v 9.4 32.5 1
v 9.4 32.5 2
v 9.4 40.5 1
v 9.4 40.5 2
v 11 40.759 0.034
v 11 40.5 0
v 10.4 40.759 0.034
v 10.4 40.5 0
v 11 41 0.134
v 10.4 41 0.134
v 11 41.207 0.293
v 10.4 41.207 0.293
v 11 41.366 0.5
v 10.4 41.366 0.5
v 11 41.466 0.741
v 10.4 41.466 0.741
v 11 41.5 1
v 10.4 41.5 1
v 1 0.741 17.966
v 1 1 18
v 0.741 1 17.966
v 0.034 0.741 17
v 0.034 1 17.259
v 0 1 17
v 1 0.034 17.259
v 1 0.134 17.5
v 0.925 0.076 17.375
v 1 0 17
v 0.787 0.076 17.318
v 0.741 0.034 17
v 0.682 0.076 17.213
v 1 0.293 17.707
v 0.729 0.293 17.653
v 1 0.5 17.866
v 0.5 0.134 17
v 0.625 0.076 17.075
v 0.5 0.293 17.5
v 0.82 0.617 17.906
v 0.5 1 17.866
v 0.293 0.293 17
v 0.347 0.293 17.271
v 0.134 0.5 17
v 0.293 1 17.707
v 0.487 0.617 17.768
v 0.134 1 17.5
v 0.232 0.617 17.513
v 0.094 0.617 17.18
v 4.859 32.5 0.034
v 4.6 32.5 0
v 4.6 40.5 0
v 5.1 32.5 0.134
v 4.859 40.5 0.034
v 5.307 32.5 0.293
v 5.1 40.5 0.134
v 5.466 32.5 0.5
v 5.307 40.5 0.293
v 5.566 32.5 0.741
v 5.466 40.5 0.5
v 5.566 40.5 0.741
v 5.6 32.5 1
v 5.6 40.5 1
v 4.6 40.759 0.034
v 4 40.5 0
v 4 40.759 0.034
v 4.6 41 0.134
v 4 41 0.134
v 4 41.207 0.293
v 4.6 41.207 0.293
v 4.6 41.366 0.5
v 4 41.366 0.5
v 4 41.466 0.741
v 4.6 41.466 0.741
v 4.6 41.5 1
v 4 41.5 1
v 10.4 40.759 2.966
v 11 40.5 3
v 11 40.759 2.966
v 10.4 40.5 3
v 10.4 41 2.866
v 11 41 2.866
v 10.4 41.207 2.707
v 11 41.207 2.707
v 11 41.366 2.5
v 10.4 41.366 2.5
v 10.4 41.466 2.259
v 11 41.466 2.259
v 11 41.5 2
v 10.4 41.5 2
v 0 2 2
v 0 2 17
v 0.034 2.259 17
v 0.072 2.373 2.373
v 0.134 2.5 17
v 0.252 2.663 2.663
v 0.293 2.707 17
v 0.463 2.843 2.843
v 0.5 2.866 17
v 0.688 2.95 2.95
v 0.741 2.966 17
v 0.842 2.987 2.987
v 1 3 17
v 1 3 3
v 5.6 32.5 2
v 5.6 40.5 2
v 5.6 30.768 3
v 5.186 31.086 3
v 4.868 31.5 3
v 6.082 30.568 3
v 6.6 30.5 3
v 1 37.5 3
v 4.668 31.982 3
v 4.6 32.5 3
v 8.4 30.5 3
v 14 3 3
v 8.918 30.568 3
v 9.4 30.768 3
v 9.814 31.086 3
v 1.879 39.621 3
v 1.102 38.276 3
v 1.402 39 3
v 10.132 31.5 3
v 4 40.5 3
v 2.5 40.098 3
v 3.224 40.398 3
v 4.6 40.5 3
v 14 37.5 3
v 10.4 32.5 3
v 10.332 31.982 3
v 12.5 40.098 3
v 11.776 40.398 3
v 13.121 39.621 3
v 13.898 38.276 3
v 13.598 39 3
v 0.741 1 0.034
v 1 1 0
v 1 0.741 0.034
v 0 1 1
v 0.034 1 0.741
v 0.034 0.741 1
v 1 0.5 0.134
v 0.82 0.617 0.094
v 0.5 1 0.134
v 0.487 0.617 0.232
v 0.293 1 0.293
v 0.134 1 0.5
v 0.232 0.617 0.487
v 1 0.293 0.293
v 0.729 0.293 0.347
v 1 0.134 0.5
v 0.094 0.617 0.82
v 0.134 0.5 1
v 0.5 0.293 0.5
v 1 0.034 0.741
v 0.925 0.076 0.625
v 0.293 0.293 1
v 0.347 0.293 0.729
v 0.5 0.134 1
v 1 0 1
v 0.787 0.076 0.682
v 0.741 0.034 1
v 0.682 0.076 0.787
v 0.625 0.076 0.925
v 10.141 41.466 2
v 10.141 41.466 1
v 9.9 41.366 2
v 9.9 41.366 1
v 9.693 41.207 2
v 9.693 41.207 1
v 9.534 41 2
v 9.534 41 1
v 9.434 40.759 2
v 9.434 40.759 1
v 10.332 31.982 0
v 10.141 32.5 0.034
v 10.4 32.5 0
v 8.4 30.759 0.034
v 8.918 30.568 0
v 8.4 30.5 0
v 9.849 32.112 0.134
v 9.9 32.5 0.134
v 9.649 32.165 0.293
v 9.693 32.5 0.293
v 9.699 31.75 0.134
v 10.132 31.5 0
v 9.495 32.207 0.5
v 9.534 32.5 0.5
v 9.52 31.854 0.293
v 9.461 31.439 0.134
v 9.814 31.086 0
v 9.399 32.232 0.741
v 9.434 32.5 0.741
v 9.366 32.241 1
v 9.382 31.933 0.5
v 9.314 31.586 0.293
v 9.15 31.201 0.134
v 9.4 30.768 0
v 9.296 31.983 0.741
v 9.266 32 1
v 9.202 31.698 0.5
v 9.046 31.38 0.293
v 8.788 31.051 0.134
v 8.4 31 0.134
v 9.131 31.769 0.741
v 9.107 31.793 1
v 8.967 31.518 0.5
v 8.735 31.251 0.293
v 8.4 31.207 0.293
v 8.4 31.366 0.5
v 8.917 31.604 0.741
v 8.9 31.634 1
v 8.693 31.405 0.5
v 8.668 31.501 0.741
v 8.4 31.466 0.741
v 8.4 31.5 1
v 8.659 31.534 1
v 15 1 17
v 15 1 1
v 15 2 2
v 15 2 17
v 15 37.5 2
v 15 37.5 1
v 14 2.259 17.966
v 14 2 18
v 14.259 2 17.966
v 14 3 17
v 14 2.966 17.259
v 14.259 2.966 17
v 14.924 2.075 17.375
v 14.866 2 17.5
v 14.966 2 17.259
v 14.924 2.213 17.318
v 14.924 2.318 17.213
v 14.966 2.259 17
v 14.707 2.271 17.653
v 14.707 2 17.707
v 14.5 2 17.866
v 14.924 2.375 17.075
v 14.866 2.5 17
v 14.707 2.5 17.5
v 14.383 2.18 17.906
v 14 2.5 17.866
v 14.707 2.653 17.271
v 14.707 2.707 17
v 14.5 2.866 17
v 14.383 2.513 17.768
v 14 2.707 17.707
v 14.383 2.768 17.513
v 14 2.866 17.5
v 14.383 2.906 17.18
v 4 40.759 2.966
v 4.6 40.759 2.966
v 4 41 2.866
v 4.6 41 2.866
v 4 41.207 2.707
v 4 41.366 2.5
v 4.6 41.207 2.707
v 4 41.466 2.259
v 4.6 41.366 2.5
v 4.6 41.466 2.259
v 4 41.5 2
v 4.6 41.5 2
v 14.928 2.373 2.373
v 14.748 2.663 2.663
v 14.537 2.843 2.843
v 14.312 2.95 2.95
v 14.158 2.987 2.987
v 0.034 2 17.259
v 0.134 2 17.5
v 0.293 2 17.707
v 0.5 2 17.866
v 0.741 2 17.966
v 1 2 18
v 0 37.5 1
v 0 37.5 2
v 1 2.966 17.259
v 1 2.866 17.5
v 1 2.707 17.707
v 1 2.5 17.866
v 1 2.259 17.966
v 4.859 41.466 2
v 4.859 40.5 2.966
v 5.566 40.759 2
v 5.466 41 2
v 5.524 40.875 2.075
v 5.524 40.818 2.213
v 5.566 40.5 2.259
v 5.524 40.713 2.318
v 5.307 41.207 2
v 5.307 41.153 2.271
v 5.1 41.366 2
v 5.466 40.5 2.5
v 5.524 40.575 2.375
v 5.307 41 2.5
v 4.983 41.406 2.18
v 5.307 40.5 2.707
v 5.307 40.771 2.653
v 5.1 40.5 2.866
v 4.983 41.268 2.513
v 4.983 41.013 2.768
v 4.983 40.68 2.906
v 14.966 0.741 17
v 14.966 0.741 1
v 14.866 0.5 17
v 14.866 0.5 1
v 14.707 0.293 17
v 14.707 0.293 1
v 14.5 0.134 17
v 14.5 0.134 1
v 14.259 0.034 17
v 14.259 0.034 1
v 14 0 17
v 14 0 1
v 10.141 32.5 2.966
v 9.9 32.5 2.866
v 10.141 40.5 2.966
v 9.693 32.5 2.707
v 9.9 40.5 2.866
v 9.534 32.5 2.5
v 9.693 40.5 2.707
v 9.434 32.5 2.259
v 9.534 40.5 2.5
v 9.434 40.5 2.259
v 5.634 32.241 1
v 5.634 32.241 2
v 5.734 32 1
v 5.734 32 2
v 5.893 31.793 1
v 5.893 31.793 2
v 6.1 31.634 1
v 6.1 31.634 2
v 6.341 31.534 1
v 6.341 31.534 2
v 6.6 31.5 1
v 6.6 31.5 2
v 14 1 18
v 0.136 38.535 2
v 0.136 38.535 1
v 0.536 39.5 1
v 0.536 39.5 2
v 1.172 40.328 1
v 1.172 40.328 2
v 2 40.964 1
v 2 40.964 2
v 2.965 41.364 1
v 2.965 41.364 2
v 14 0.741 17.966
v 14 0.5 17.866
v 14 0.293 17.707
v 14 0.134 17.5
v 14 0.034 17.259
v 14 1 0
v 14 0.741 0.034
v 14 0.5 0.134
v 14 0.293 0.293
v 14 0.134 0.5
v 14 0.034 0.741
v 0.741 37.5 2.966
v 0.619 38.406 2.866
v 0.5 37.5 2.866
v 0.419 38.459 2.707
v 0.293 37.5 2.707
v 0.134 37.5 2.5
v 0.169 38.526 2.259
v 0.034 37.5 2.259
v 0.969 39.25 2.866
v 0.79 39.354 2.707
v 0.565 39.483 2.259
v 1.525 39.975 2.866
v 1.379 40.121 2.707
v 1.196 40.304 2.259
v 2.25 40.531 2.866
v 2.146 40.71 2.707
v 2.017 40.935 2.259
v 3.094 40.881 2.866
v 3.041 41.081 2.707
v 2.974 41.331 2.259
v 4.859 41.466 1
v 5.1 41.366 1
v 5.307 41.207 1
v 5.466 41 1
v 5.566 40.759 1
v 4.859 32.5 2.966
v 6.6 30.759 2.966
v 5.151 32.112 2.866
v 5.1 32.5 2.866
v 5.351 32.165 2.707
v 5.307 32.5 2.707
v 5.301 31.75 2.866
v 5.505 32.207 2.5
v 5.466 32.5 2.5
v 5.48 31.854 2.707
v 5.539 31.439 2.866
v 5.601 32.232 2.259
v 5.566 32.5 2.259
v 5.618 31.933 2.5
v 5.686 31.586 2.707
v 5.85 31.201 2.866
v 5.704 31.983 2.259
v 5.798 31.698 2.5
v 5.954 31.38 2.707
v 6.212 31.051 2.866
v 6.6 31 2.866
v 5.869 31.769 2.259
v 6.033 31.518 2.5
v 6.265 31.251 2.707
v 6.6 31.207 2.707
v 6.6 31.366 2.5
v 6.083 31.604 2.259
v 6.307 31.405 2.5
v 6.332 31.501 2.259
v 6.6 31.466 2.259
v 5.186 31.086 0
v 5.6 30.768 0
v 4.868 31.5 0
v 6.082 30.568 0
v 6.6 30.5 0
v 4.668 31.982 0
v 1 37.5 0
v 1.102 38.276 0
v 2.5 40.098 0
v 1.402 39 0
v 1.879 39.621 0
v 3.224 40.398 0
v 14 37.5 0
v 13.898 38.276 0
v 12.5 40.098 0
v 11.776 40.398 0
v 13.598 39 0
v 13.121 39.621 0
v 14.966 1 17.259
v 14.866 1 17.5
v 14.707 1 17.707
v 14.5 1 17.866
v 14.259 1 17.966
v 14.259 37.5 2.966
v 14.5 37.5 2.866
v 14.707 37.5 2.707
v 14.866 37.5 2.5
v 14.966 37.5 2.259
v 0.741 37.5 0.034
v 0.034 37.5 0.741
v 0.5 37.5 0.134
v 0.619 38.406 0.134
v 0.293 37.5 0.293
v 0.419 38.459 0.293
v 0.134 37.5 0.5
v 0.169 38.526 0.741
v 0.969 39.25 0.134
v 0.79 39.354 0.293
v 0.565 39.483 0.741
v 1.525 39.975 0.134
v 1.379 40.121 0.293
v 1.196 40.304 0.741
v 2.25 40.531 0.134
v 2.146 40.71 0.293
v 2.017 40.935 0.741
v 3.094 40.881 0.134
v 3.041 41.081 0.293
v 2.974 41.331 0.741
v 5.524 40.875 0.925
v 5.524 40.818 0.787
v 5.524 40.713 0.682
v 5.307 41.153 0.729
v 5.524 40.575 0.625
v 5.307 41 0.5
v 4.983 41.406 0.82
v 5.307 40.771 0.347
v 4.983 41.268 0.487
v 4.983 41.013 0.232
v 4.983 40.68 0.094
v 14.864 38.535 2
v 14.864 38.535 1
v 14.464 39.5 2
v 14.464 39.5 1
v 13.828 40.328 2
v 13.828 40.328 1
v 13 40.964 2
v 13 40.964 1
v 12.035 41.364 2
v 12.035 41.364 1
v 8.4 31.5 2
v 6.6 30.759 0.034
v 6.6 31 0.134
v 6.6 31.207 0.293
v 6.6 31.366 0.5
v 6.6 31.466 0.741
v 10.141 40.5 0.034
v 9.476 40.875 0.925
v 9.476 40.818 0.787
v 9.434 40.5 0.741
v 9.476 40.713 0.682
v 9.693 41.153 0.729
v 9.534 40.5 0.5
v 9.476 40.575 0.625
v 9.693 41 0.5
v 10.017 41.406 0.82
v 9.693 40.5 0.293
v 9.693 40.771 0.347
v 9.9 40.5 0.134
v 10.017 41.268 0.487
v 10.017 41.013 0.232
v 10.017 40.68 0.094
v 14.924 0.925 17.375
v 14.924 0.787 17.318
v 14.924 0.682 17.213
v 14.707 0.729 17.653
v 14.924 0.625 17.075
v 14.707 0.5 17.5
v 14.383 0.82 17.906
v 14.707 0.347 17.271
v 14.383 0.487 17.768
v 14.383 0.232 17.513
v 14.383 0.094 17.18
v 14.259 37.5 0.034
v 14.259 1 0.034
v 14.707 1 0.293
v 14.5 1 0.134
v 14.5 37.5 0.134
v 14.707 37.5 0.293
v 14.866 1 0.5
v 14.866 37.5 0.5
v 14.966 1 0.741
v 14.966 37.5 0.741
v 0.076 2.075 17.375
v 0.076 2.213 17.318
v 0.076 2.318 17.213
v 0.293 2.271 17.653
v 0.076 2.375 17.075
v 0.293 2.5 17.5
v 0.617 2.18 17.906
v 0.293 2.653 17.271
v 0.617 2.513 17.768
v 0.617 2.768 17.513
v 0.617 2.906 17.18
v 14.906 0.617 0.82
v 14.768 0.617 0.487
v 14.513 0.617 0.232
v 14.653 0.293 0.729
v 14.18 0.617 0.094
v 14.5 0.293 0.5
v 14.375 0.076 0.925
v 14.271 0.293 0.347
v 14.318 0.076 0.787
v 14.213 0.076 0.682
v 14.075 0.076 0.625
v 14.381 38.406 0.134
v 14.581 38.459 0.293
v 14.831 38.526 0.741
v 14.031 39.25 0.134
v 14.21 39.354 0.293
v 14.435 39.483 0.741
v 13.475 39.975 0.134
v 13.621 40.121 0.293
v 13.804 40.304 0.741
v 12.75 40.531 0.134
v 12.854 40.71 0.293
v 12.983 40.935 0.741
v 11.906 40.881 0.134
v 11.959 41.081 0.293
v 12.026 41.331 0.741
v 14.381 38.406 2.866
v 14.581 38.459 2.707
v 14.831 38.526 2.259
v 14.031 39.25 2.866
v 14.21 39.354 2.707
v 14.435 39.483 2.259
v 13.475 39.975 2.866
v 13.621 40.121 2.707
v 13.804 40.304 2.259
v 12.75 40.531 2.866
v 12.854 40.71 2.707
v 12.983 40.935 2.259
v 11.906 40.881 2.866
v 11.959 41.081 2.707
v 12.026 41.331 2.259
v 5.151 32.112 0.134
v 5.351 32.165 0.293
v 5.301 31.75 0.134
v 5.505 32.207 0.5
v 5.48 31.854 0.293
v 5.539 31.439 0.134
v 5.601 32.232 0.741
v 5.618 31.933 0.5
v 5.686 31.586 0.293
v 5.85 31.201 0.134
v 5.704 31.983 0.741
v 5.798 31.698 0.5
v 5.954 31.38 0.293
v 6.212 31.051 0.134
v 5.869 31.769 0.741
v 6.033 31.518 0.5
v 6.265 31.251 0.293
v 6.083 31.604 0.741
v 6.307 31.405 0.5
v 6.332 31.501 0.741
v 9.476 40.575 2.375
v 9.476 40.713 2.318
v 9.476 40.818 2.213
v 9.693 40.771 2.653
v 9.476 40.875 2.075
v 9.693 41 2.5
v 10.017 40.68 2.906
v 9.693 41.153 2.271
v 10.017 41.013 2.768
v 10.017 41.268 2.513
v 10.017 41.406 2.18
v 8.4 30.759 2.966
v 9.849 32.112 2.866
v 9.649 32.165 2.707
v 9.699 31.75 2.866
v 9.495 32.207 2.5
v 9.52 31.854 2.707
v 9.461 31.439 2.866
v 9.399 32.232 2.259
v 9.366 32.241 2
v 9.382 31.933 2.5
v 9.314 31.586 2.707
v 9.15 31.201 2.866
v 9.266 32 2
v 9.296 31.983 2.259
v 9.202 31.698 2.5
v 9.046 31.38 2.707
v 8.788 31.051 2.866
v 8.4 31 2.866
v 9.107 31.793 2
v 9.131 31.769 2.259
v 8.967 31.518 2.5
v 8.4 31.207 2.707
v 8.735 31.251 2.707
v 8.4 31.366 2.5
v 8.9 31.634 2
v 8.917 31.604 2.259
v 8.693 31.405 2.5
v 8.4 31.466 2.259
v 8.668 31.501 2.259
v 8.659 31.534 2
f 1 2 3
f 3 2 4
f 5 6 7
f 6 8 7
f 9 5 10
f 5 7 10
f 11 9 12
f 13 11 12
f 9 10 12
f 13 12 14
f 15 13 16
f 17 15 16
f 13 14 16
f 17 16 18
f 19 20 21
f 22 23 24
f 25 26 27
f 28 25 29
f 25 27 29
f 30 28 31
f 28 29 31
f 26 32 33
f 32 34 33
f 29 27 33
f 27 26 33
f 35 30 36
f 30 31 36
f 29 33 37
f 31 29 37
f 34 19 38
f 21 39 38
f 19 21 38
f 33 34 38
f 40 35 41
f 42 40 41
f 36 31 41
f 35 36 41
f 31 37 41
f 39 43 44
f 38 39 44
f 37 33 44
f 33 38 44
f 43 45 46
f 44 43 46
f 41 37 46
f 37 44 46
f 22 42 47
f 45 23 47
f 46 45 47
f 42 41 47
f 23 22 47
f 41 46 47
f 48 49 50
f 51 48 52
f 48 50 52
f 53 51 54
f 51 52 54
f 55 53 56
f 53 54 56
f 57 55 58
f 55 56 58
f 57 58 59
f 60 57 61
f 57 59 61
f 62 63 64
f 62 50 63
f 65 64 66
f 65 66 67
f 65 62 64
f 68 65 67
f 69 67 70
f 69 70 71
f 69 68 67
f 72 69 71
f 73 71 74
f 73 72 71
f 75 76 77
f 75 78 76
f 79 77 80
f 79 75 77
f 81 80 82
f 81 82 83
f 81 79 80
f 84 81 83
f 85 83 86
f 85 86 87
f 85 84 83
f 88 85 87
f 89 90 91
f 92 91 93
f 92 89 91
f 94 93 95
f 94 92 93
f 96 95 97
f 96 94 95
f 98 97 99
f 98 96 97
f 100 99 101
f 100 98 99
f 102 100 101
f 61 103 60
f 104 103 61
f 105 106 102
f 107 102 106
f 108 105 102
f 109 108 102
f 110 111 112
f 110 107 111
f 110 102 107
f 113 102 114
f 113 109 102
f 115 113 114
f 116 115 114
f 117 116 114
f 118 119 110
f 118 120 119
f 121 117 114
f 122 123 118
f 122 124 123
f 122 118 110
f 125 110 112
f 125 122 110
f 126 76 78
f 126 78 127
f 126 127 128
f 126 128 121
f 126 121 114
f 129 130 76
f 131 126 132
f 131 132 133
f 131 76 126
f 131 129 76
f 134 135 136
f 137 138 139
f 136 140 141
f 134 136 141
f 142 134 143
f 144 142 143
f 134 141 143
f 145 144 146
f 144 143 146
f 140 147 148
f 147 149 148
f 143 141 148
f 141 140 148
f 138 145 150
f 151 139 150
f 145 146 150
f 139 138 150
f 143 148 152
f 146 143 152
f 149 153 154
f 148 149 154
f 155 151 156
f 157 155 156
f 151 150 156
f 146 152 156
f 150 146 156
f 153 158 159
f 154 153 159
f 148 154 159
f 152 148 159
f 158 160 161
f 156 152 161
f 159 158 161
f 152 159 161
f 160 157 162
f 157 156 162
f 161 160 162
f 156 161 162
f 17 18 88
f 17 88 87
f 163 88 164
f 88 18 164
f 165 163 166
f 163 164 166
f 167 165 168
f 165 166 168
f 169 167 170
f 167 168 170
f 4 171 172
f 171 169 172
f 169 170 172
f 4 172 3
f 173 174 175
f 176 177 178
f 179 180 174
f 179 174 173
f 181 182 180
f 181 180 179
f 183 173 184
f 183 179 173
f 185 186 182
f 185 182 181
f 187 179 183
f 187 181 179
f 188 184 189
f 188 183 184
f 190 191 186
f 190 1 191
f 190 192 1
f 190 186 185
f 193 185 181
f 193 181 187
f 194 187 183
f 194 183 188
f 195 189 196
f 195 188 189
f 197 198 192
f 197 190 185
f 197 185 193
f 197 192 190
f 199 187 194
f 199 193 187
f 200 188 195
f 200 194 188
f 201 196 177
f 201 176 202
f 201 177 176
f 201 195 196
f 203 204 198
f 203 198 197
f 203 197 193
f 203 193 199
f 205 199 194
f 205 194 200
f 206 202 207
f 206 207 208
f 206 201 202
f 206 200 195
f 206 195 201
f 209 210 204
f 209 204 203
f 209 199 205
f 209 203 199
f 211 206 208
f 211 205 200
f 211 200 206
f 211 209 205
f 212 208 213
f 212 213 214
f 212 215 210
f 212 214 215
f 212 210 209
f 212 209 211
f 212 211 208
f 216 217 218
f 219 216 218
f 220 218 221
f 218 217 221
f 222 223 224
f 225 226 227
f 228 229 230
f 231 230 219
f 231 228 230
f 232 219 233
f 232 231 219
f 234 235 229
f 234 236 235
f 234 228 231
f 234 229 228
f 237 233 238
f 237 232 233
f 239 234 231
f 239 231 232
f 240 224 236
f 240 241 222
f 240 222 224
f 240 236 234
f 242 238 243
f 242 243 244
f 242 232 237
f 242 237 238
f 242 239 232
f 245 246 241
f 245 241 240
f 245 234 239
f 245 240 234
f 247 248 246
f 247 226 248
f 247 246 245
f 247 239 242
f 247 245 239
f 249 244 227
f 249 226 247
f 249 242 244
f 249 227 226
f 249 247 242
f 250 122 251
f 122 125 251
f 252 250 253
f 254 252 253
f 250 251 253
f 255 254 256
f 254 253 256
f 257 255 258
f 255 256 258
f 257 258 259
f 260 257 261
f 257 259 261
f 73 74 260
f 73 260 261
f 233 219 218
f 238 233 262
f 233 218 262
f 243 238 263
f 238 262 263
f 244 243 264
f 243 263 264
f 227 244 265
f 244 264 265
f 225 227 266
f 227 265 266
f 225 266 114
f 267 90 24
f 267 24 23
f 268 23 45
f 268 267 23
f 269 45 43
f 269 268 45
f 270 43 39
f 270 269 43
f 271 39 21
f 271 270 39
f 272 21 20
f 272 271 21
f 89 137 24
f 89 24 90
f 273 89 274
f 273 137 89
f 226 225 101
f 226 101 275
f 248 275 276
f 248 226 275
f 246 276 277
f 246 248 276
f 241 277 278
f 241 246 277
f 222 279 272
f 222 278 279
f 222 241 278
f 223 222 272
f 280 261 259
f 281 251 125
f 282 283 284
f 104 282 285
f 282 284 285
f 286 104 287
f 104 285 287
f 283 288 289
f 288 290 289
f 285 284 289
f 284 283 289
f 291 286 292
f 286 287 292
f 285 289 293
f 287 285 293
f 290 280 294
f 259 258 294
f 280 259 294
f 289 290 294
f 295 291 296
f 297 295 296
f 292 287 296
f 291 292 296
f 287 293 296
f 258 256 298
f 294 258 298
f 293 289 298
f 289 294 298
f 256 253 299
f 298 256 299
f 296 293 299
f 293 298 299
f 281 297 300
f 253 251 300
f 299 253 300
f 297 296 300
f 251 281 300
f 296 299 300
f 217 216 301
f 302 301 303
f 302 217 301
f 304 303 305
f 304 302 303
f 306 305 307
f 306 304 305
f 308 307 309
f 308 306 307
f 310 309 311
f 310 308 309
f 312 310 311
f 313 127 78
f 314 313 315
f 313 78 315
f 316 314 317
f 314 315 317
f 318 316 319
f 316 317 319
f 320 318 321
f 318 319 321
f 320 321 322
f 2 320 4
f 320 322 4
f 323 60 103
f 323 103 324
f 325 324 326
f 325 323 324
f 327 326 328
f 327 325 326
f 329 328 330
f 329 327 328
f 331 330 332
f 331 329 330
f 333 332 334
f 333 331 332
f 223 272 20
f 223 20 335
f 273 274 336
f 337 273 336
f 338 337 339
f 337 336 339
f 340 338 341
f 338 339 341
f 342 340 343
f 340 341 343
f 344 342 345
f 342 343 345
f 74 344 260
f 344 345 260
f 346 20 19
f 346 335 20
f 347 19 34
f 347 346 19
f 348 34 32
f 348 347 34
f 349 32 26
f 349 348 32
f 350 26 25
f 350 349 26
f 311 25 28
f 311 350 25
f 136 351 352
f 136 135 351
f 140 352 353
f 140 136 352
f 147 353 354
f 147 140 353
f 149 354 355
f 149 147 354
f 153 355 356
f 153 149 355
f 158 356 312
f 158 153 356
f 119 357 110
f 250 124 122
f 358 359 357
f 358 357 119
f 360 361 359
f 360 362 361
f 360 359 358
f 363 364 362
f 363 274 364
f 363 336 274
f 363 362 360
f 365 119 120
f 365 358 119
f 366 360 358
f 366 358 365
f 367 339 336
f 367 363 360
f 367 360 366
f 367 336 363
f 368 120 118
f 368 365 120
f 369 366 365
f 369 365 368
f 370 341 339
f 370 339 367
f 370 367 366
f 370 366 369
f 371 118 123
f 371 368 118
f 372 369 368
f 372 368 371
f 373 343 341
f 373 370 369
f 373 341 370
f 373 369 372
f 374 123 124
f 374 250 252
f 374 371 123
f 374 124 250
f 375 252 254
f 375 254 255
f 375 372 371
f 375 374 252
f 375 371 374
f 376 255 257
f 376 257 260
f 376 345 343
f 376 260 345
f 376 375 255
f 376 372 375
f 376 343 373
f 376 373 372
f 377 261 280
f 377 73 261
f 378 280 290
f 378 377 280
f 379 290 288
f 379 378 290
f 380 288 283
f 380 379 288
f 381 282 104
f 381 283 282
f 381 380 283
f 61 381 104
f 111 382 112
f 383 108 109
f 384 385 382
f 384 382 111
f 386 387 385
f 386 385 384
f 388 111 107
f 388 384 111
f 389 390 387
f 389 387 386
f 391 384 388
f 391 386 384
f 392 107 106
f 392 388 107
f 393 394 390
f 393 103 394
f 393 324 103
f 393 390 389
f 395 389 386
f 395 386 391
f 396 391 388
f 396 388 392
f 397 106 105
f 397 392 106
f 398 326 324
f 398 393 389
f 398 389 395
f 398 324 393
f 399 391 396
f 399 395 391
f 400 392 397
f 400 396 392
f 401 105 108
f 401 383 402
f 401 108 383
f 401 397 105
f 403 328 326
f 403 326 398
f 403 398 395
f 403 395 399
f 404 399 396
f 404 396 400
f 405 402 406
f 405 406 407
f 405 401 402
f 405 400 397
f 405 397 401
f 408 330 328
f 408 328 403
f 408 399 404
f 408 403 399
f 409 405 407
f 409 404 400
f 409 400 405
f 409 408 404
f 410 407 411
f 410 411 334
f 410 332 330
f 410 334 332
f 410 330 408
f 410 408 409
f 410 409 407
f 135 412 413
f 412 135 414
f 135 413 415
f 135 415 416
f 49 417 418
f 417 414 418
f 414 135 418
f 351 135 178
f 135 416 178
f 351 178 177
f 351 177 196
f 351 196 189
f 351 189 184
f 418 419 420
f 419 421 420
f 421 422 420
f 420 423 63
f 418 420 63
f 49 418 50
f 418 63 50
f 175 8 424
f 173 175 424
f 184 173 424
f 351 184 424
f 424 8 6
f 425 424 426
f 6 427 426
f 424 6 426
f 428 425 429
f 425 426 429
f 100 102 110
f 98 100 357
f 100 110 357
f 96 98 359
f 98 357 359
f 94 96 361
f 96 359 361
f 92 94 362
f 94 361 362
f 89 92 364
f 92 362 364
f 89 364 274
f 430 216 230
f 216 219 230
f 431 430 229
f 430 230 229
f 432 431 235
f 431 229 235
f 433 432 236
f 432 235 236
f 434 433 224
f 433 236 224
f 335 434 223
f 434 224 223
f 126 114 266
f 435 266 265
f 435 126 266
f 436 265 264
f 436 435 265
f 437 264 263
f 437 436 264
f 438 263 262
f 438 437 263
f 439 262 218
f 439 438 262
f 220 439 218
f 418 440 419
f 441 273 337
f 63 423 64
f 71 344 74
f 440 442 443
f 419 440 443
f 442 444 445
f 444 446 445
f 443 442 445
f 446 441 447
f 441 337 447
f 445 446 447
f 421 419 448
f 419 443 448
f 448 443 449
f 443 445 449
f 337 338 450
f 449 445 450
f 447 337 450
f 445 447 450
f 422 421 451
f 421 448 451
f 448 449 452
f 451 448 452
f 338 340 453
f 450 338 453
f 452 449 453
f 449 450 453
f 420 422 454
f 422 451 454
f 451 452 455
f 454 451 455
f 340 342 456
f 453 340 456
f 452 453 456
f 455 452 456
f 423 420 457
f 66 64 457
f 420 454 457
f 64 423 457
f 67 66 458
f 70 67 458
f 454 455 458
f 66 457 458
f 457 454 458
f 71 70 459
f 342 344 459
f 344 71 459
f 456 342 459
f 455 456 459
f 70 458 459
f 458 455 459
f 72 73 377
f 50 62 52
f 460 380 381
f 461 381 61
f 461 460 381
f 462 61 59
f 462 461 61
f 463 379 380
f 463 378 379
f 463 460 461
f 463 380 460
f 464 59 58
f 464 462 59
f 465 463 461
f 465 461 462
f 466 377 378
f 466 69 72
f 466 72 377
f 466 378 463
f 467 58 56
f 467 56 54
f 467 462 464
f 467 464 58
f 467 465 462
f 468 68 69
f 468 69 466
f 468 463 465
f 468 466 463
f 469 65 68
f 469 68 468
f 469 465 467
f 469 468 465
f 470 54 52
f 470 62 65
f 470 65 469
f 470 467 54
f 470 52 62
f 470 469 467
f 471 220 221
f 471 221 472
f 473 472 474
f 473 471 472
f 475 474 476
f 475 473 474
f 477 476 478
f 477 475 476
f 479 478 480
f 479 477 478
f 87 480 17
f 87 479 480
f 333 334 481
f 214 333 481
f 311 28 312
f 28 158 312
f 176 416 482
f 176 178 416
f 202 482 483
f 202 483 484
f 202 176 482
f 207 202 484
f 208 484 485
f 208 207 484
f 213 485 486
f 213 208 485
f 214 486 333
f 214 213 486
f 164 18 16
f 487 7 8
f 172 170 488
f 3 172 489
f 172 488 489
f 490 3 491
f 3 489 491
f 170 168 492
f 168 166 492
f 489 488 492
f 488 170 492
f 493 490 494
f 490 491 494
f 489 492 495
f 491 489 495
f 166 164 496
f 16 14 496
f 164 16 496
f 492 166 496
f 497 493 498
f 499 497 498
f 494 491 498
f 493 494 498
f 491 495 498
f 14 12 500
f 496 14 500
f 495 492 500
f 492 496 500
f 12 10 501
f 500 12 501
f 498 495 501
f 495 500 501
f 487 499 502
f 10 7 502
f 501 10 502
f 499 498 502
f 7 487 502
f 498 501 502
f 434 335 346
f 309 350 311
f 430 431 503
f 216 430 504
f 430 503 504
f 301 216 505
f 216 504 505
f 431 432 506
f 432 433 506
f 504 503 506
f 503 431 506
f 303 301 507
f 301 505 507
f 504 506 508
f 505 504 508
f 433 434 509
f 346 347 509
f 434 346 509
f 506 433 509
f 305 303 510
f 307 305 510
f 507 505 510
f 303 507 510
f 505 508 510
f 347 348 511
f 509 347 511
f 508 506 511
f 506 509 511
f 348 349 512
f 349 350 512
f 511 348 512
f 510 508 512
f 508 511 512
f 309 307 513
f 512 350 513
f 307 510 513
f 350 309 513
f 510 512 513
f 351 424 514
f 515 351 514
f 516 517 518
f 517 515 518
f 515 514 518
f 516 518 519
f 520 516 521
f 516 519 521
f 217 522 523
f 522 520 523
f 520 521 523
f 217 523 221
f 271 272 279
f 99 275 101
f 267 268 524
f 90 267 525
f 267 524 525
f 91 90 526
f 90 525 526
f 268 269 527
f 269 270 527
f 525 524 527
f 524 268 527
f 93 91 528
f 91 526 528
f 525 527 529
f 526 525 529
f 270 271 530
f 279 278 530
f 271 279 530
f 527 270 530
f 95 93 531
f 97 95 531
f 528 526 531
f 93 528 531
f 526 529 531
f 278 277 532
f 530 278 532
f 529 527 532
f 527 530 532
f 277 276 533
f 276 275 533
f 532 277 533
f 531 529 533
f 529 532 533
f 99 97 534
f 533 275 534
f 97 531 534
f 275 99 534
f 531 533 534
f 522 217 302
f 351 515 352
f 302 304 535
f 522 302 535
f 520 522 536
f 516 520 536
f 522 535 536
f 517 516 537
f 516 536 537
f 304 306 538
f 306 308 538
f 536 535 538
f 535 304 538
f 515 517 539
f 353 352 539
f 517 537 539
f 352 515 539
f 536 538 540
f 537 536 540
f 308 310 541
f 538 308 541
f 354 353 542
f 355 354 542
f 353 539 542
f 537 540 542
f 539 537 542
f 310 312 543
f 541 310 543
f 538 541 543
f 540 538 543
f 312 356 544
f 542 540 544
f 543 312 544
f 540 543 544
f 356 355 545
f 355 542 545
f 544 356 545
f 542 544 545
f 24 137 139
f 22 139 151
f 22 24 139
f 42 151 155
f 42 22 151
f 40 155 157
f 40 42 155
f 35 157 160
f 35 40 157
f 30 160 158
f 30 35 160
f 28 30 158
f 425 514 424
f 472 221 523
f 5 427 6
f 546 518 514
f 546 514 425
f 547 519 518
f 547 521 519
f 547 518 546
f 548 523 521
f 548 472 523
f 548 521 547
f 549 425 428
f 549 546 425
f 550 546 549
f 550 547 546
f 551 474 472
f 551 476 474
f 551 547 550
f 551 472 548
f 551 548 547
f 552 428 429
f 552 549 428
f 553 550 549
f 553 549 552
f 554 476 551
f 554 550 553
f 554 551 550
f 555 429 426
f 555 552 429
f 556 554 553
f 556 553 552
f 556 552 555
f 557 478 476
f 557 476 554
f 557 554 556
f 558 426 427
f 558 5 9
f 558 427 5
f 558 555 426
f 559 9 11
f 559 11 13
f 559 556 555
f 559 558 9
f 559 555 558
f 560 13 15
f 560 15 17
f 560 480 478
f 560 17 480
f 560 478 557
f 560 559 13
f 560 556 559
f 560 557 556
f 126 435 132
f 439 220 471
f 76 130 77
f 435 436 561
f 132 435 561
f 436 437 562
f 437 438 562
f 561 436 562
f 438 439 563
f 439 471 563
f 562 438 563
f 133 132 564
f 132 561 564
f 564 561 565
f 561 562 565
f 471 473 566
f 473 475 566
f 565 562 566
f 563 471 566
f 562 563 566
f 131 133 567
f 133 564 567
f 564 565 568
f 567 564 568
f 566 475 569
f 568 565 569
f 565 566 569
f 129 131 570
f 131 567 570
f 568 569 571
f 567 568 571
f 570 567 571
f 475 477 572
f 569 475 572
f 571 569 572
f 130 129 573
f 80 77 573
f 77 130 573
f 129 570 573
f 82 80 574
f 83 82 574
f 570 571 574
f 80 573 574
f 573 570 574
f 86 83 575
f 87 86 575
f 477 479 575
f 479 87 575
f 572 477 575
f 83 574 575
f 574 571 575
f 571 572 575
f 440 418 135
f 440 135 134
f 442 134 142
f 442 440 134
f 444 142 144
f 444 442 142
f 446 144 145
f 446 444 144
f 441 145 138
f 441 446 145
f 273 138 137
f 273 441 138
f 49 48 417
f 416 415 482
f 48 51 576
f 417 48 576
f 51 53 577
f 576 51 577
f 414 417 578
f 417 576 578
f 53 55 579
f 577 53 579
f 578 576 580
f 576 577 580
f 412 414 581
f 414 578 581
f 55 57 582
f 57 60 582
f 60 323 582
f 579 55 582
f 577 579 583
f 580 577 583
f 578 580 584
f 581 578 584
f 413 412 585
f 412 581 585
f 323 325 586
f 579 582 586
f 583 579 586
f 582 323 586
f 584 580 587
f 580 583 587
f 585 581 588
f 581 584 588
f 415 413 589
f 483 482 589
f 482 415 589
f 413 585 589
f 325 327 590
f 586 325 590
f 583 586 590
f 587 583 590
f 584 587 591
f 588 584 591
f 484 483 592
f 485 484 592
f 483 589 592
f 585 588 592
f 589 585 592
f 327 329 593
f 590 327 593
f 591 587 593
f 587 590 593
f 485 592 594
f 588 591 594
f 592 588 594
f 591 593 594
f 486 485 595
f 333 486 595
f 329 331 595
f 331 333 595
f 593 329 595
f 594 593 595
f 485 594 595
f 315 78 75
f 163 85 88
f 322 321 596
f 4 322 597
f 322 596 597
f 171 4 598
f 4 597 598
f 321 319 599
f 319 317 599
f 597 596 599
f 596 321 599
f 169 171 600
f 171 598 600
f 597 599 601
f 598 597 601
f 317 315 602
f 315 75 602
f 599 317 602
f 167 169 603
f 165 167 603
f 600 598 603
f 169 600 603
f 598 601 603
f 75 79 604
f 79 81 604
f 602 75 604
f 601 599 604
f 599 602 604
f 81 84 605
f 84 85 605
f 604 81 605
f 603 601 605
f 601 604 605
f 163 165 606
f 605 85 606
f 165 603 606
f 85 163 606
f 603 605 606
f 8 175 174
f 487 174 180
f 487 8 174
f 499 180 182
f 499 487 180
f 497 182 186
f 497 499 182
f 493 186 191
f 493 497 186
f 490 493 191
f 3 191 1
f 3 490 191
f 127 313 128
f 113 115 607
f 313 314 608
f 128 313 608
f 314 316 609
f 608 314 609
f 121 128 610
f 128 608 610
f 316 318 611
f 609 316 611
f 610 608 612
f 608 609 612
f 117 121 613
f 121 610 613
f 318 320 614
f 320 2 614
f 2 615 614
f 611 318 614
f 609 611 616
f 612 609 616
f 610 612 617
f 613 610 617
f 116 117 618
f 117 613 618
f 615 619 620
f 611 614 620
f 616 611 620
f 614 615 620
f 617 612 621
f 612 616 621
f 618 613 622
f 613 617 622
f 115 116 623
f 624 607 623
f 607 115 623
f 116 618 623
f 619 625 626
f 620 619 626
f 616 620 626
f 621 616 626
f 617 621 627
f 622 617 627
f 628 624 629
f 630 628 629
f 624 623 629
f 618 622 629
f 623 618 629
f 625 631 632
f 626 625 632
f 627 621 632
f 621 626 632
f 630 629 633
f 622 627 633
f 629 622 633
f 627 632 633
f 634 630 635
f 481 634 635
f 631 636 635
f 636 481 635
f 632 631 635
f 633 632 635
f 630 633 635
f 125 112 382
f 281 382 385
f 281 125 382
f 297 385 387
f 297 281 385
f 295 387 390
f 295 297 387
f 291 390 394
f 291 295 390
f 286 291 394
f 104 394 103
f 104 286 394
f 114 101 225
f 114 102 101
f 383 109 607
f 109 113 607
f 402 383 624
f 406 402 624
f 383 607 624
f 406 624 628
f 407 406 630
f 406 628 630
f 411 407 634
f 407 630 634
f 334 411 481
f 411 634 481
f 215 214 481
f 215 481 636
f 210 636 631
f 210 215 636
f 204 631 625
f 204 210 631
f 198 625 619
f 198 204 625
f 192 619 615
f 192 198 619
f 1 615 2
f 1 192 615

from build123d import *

# Parameters (mm, degrees)
SKETCH_W     = 15
SKETCH_H     = 41.5
PAD_DEPTH    = 3
SKETCH001_W  = 15
SKETCH001_H  = 3
PAD001_DEPTH = 15
SKETCH002_W  = 3.8
SKETCH002_H  = 10
POCKET_DEPTH = 3
FILLET_R     = 4
FILLET001_R  = 1
FILLET002_R  = 1


with BuildPart() as part:
    # Sketch → Pad (new body)
    with BuildSketch(Plane.XY):
        with Locations((7.5, 20.75)):
            Rectangle(SKETCH_W, SKETCH_H)
    extrude(amount=PAD_DEPTH)

    # Sketch001 (on Face6 of Pad) → Pad001 (join)
    with BuildSketch(Plane.XY.offset(3)):
        with Locations((7.5, 1.5)):
            Rectangle(SKETCH001_W, SKETCH001_H)
    extrude(amount=PAD001_DEPTH)

    # Sketch002 (on Face7 of Pad001) → Pocket (cut)
    with BuildSketch(Plane.XY.offset(3)):
        with Locations((7.5, 36.5)):
            Rectangle(SKETCH002_W, SKETCH002_H)
    extrude(amount=-POCKET_DEPTH, mode=Mode.SUBTRACT)

    # Fillet
    fillet_edges = [part.edges().sort_by_distance(p)[0] for p in [
        (0, 41.5, 1.5),
        (15, 41.5, 1.5),
    ]]
    fillet(fillet_edges, radius=FILLET_R)

    # Fillet001
    fillet001_edges = [part.edges().sort_by_distance(p)[0] for p in [
        (13.828427, 40.328427, 3),
        (13.828427, 40.328427, 0),
        (4.8, 41.5, 3),
        (4.8, 41.5, 0),
        (5.6, 41.5, 1.5),
        (5.6, 36.5, 0),
        (5.6, 36.5, 3),
        (9.4, 36.5, 3),
        (7.5, 31.5, 3),
        (9.4, 41.5, 1.5),
        (9.4, 36.5, 0),
        (7.5, 31.5, 0),
        (9.4, 31.5, 1.5),
        (5.6, 31.5, 1.5),
    ]]
    fillet(fillet001_edges, radius=FILLET001_R)

    # Fillet002
    fillet002_edges = [part.edges().sort_by_distance(p)[0] for p in [
        (7.5, 3, 18),
        (0, 1.5, 18),
        (7.5, 0, 18),
        (15, 1.5, 18),
        (0, 3, 10.5),
        (0, 0, 10.5),
        (15, 3, 10.5),
        (15, 0, 10.5),
    ]]
    fillet(fillet002_edges, radius=FILLET002_R)


solid = part.part
